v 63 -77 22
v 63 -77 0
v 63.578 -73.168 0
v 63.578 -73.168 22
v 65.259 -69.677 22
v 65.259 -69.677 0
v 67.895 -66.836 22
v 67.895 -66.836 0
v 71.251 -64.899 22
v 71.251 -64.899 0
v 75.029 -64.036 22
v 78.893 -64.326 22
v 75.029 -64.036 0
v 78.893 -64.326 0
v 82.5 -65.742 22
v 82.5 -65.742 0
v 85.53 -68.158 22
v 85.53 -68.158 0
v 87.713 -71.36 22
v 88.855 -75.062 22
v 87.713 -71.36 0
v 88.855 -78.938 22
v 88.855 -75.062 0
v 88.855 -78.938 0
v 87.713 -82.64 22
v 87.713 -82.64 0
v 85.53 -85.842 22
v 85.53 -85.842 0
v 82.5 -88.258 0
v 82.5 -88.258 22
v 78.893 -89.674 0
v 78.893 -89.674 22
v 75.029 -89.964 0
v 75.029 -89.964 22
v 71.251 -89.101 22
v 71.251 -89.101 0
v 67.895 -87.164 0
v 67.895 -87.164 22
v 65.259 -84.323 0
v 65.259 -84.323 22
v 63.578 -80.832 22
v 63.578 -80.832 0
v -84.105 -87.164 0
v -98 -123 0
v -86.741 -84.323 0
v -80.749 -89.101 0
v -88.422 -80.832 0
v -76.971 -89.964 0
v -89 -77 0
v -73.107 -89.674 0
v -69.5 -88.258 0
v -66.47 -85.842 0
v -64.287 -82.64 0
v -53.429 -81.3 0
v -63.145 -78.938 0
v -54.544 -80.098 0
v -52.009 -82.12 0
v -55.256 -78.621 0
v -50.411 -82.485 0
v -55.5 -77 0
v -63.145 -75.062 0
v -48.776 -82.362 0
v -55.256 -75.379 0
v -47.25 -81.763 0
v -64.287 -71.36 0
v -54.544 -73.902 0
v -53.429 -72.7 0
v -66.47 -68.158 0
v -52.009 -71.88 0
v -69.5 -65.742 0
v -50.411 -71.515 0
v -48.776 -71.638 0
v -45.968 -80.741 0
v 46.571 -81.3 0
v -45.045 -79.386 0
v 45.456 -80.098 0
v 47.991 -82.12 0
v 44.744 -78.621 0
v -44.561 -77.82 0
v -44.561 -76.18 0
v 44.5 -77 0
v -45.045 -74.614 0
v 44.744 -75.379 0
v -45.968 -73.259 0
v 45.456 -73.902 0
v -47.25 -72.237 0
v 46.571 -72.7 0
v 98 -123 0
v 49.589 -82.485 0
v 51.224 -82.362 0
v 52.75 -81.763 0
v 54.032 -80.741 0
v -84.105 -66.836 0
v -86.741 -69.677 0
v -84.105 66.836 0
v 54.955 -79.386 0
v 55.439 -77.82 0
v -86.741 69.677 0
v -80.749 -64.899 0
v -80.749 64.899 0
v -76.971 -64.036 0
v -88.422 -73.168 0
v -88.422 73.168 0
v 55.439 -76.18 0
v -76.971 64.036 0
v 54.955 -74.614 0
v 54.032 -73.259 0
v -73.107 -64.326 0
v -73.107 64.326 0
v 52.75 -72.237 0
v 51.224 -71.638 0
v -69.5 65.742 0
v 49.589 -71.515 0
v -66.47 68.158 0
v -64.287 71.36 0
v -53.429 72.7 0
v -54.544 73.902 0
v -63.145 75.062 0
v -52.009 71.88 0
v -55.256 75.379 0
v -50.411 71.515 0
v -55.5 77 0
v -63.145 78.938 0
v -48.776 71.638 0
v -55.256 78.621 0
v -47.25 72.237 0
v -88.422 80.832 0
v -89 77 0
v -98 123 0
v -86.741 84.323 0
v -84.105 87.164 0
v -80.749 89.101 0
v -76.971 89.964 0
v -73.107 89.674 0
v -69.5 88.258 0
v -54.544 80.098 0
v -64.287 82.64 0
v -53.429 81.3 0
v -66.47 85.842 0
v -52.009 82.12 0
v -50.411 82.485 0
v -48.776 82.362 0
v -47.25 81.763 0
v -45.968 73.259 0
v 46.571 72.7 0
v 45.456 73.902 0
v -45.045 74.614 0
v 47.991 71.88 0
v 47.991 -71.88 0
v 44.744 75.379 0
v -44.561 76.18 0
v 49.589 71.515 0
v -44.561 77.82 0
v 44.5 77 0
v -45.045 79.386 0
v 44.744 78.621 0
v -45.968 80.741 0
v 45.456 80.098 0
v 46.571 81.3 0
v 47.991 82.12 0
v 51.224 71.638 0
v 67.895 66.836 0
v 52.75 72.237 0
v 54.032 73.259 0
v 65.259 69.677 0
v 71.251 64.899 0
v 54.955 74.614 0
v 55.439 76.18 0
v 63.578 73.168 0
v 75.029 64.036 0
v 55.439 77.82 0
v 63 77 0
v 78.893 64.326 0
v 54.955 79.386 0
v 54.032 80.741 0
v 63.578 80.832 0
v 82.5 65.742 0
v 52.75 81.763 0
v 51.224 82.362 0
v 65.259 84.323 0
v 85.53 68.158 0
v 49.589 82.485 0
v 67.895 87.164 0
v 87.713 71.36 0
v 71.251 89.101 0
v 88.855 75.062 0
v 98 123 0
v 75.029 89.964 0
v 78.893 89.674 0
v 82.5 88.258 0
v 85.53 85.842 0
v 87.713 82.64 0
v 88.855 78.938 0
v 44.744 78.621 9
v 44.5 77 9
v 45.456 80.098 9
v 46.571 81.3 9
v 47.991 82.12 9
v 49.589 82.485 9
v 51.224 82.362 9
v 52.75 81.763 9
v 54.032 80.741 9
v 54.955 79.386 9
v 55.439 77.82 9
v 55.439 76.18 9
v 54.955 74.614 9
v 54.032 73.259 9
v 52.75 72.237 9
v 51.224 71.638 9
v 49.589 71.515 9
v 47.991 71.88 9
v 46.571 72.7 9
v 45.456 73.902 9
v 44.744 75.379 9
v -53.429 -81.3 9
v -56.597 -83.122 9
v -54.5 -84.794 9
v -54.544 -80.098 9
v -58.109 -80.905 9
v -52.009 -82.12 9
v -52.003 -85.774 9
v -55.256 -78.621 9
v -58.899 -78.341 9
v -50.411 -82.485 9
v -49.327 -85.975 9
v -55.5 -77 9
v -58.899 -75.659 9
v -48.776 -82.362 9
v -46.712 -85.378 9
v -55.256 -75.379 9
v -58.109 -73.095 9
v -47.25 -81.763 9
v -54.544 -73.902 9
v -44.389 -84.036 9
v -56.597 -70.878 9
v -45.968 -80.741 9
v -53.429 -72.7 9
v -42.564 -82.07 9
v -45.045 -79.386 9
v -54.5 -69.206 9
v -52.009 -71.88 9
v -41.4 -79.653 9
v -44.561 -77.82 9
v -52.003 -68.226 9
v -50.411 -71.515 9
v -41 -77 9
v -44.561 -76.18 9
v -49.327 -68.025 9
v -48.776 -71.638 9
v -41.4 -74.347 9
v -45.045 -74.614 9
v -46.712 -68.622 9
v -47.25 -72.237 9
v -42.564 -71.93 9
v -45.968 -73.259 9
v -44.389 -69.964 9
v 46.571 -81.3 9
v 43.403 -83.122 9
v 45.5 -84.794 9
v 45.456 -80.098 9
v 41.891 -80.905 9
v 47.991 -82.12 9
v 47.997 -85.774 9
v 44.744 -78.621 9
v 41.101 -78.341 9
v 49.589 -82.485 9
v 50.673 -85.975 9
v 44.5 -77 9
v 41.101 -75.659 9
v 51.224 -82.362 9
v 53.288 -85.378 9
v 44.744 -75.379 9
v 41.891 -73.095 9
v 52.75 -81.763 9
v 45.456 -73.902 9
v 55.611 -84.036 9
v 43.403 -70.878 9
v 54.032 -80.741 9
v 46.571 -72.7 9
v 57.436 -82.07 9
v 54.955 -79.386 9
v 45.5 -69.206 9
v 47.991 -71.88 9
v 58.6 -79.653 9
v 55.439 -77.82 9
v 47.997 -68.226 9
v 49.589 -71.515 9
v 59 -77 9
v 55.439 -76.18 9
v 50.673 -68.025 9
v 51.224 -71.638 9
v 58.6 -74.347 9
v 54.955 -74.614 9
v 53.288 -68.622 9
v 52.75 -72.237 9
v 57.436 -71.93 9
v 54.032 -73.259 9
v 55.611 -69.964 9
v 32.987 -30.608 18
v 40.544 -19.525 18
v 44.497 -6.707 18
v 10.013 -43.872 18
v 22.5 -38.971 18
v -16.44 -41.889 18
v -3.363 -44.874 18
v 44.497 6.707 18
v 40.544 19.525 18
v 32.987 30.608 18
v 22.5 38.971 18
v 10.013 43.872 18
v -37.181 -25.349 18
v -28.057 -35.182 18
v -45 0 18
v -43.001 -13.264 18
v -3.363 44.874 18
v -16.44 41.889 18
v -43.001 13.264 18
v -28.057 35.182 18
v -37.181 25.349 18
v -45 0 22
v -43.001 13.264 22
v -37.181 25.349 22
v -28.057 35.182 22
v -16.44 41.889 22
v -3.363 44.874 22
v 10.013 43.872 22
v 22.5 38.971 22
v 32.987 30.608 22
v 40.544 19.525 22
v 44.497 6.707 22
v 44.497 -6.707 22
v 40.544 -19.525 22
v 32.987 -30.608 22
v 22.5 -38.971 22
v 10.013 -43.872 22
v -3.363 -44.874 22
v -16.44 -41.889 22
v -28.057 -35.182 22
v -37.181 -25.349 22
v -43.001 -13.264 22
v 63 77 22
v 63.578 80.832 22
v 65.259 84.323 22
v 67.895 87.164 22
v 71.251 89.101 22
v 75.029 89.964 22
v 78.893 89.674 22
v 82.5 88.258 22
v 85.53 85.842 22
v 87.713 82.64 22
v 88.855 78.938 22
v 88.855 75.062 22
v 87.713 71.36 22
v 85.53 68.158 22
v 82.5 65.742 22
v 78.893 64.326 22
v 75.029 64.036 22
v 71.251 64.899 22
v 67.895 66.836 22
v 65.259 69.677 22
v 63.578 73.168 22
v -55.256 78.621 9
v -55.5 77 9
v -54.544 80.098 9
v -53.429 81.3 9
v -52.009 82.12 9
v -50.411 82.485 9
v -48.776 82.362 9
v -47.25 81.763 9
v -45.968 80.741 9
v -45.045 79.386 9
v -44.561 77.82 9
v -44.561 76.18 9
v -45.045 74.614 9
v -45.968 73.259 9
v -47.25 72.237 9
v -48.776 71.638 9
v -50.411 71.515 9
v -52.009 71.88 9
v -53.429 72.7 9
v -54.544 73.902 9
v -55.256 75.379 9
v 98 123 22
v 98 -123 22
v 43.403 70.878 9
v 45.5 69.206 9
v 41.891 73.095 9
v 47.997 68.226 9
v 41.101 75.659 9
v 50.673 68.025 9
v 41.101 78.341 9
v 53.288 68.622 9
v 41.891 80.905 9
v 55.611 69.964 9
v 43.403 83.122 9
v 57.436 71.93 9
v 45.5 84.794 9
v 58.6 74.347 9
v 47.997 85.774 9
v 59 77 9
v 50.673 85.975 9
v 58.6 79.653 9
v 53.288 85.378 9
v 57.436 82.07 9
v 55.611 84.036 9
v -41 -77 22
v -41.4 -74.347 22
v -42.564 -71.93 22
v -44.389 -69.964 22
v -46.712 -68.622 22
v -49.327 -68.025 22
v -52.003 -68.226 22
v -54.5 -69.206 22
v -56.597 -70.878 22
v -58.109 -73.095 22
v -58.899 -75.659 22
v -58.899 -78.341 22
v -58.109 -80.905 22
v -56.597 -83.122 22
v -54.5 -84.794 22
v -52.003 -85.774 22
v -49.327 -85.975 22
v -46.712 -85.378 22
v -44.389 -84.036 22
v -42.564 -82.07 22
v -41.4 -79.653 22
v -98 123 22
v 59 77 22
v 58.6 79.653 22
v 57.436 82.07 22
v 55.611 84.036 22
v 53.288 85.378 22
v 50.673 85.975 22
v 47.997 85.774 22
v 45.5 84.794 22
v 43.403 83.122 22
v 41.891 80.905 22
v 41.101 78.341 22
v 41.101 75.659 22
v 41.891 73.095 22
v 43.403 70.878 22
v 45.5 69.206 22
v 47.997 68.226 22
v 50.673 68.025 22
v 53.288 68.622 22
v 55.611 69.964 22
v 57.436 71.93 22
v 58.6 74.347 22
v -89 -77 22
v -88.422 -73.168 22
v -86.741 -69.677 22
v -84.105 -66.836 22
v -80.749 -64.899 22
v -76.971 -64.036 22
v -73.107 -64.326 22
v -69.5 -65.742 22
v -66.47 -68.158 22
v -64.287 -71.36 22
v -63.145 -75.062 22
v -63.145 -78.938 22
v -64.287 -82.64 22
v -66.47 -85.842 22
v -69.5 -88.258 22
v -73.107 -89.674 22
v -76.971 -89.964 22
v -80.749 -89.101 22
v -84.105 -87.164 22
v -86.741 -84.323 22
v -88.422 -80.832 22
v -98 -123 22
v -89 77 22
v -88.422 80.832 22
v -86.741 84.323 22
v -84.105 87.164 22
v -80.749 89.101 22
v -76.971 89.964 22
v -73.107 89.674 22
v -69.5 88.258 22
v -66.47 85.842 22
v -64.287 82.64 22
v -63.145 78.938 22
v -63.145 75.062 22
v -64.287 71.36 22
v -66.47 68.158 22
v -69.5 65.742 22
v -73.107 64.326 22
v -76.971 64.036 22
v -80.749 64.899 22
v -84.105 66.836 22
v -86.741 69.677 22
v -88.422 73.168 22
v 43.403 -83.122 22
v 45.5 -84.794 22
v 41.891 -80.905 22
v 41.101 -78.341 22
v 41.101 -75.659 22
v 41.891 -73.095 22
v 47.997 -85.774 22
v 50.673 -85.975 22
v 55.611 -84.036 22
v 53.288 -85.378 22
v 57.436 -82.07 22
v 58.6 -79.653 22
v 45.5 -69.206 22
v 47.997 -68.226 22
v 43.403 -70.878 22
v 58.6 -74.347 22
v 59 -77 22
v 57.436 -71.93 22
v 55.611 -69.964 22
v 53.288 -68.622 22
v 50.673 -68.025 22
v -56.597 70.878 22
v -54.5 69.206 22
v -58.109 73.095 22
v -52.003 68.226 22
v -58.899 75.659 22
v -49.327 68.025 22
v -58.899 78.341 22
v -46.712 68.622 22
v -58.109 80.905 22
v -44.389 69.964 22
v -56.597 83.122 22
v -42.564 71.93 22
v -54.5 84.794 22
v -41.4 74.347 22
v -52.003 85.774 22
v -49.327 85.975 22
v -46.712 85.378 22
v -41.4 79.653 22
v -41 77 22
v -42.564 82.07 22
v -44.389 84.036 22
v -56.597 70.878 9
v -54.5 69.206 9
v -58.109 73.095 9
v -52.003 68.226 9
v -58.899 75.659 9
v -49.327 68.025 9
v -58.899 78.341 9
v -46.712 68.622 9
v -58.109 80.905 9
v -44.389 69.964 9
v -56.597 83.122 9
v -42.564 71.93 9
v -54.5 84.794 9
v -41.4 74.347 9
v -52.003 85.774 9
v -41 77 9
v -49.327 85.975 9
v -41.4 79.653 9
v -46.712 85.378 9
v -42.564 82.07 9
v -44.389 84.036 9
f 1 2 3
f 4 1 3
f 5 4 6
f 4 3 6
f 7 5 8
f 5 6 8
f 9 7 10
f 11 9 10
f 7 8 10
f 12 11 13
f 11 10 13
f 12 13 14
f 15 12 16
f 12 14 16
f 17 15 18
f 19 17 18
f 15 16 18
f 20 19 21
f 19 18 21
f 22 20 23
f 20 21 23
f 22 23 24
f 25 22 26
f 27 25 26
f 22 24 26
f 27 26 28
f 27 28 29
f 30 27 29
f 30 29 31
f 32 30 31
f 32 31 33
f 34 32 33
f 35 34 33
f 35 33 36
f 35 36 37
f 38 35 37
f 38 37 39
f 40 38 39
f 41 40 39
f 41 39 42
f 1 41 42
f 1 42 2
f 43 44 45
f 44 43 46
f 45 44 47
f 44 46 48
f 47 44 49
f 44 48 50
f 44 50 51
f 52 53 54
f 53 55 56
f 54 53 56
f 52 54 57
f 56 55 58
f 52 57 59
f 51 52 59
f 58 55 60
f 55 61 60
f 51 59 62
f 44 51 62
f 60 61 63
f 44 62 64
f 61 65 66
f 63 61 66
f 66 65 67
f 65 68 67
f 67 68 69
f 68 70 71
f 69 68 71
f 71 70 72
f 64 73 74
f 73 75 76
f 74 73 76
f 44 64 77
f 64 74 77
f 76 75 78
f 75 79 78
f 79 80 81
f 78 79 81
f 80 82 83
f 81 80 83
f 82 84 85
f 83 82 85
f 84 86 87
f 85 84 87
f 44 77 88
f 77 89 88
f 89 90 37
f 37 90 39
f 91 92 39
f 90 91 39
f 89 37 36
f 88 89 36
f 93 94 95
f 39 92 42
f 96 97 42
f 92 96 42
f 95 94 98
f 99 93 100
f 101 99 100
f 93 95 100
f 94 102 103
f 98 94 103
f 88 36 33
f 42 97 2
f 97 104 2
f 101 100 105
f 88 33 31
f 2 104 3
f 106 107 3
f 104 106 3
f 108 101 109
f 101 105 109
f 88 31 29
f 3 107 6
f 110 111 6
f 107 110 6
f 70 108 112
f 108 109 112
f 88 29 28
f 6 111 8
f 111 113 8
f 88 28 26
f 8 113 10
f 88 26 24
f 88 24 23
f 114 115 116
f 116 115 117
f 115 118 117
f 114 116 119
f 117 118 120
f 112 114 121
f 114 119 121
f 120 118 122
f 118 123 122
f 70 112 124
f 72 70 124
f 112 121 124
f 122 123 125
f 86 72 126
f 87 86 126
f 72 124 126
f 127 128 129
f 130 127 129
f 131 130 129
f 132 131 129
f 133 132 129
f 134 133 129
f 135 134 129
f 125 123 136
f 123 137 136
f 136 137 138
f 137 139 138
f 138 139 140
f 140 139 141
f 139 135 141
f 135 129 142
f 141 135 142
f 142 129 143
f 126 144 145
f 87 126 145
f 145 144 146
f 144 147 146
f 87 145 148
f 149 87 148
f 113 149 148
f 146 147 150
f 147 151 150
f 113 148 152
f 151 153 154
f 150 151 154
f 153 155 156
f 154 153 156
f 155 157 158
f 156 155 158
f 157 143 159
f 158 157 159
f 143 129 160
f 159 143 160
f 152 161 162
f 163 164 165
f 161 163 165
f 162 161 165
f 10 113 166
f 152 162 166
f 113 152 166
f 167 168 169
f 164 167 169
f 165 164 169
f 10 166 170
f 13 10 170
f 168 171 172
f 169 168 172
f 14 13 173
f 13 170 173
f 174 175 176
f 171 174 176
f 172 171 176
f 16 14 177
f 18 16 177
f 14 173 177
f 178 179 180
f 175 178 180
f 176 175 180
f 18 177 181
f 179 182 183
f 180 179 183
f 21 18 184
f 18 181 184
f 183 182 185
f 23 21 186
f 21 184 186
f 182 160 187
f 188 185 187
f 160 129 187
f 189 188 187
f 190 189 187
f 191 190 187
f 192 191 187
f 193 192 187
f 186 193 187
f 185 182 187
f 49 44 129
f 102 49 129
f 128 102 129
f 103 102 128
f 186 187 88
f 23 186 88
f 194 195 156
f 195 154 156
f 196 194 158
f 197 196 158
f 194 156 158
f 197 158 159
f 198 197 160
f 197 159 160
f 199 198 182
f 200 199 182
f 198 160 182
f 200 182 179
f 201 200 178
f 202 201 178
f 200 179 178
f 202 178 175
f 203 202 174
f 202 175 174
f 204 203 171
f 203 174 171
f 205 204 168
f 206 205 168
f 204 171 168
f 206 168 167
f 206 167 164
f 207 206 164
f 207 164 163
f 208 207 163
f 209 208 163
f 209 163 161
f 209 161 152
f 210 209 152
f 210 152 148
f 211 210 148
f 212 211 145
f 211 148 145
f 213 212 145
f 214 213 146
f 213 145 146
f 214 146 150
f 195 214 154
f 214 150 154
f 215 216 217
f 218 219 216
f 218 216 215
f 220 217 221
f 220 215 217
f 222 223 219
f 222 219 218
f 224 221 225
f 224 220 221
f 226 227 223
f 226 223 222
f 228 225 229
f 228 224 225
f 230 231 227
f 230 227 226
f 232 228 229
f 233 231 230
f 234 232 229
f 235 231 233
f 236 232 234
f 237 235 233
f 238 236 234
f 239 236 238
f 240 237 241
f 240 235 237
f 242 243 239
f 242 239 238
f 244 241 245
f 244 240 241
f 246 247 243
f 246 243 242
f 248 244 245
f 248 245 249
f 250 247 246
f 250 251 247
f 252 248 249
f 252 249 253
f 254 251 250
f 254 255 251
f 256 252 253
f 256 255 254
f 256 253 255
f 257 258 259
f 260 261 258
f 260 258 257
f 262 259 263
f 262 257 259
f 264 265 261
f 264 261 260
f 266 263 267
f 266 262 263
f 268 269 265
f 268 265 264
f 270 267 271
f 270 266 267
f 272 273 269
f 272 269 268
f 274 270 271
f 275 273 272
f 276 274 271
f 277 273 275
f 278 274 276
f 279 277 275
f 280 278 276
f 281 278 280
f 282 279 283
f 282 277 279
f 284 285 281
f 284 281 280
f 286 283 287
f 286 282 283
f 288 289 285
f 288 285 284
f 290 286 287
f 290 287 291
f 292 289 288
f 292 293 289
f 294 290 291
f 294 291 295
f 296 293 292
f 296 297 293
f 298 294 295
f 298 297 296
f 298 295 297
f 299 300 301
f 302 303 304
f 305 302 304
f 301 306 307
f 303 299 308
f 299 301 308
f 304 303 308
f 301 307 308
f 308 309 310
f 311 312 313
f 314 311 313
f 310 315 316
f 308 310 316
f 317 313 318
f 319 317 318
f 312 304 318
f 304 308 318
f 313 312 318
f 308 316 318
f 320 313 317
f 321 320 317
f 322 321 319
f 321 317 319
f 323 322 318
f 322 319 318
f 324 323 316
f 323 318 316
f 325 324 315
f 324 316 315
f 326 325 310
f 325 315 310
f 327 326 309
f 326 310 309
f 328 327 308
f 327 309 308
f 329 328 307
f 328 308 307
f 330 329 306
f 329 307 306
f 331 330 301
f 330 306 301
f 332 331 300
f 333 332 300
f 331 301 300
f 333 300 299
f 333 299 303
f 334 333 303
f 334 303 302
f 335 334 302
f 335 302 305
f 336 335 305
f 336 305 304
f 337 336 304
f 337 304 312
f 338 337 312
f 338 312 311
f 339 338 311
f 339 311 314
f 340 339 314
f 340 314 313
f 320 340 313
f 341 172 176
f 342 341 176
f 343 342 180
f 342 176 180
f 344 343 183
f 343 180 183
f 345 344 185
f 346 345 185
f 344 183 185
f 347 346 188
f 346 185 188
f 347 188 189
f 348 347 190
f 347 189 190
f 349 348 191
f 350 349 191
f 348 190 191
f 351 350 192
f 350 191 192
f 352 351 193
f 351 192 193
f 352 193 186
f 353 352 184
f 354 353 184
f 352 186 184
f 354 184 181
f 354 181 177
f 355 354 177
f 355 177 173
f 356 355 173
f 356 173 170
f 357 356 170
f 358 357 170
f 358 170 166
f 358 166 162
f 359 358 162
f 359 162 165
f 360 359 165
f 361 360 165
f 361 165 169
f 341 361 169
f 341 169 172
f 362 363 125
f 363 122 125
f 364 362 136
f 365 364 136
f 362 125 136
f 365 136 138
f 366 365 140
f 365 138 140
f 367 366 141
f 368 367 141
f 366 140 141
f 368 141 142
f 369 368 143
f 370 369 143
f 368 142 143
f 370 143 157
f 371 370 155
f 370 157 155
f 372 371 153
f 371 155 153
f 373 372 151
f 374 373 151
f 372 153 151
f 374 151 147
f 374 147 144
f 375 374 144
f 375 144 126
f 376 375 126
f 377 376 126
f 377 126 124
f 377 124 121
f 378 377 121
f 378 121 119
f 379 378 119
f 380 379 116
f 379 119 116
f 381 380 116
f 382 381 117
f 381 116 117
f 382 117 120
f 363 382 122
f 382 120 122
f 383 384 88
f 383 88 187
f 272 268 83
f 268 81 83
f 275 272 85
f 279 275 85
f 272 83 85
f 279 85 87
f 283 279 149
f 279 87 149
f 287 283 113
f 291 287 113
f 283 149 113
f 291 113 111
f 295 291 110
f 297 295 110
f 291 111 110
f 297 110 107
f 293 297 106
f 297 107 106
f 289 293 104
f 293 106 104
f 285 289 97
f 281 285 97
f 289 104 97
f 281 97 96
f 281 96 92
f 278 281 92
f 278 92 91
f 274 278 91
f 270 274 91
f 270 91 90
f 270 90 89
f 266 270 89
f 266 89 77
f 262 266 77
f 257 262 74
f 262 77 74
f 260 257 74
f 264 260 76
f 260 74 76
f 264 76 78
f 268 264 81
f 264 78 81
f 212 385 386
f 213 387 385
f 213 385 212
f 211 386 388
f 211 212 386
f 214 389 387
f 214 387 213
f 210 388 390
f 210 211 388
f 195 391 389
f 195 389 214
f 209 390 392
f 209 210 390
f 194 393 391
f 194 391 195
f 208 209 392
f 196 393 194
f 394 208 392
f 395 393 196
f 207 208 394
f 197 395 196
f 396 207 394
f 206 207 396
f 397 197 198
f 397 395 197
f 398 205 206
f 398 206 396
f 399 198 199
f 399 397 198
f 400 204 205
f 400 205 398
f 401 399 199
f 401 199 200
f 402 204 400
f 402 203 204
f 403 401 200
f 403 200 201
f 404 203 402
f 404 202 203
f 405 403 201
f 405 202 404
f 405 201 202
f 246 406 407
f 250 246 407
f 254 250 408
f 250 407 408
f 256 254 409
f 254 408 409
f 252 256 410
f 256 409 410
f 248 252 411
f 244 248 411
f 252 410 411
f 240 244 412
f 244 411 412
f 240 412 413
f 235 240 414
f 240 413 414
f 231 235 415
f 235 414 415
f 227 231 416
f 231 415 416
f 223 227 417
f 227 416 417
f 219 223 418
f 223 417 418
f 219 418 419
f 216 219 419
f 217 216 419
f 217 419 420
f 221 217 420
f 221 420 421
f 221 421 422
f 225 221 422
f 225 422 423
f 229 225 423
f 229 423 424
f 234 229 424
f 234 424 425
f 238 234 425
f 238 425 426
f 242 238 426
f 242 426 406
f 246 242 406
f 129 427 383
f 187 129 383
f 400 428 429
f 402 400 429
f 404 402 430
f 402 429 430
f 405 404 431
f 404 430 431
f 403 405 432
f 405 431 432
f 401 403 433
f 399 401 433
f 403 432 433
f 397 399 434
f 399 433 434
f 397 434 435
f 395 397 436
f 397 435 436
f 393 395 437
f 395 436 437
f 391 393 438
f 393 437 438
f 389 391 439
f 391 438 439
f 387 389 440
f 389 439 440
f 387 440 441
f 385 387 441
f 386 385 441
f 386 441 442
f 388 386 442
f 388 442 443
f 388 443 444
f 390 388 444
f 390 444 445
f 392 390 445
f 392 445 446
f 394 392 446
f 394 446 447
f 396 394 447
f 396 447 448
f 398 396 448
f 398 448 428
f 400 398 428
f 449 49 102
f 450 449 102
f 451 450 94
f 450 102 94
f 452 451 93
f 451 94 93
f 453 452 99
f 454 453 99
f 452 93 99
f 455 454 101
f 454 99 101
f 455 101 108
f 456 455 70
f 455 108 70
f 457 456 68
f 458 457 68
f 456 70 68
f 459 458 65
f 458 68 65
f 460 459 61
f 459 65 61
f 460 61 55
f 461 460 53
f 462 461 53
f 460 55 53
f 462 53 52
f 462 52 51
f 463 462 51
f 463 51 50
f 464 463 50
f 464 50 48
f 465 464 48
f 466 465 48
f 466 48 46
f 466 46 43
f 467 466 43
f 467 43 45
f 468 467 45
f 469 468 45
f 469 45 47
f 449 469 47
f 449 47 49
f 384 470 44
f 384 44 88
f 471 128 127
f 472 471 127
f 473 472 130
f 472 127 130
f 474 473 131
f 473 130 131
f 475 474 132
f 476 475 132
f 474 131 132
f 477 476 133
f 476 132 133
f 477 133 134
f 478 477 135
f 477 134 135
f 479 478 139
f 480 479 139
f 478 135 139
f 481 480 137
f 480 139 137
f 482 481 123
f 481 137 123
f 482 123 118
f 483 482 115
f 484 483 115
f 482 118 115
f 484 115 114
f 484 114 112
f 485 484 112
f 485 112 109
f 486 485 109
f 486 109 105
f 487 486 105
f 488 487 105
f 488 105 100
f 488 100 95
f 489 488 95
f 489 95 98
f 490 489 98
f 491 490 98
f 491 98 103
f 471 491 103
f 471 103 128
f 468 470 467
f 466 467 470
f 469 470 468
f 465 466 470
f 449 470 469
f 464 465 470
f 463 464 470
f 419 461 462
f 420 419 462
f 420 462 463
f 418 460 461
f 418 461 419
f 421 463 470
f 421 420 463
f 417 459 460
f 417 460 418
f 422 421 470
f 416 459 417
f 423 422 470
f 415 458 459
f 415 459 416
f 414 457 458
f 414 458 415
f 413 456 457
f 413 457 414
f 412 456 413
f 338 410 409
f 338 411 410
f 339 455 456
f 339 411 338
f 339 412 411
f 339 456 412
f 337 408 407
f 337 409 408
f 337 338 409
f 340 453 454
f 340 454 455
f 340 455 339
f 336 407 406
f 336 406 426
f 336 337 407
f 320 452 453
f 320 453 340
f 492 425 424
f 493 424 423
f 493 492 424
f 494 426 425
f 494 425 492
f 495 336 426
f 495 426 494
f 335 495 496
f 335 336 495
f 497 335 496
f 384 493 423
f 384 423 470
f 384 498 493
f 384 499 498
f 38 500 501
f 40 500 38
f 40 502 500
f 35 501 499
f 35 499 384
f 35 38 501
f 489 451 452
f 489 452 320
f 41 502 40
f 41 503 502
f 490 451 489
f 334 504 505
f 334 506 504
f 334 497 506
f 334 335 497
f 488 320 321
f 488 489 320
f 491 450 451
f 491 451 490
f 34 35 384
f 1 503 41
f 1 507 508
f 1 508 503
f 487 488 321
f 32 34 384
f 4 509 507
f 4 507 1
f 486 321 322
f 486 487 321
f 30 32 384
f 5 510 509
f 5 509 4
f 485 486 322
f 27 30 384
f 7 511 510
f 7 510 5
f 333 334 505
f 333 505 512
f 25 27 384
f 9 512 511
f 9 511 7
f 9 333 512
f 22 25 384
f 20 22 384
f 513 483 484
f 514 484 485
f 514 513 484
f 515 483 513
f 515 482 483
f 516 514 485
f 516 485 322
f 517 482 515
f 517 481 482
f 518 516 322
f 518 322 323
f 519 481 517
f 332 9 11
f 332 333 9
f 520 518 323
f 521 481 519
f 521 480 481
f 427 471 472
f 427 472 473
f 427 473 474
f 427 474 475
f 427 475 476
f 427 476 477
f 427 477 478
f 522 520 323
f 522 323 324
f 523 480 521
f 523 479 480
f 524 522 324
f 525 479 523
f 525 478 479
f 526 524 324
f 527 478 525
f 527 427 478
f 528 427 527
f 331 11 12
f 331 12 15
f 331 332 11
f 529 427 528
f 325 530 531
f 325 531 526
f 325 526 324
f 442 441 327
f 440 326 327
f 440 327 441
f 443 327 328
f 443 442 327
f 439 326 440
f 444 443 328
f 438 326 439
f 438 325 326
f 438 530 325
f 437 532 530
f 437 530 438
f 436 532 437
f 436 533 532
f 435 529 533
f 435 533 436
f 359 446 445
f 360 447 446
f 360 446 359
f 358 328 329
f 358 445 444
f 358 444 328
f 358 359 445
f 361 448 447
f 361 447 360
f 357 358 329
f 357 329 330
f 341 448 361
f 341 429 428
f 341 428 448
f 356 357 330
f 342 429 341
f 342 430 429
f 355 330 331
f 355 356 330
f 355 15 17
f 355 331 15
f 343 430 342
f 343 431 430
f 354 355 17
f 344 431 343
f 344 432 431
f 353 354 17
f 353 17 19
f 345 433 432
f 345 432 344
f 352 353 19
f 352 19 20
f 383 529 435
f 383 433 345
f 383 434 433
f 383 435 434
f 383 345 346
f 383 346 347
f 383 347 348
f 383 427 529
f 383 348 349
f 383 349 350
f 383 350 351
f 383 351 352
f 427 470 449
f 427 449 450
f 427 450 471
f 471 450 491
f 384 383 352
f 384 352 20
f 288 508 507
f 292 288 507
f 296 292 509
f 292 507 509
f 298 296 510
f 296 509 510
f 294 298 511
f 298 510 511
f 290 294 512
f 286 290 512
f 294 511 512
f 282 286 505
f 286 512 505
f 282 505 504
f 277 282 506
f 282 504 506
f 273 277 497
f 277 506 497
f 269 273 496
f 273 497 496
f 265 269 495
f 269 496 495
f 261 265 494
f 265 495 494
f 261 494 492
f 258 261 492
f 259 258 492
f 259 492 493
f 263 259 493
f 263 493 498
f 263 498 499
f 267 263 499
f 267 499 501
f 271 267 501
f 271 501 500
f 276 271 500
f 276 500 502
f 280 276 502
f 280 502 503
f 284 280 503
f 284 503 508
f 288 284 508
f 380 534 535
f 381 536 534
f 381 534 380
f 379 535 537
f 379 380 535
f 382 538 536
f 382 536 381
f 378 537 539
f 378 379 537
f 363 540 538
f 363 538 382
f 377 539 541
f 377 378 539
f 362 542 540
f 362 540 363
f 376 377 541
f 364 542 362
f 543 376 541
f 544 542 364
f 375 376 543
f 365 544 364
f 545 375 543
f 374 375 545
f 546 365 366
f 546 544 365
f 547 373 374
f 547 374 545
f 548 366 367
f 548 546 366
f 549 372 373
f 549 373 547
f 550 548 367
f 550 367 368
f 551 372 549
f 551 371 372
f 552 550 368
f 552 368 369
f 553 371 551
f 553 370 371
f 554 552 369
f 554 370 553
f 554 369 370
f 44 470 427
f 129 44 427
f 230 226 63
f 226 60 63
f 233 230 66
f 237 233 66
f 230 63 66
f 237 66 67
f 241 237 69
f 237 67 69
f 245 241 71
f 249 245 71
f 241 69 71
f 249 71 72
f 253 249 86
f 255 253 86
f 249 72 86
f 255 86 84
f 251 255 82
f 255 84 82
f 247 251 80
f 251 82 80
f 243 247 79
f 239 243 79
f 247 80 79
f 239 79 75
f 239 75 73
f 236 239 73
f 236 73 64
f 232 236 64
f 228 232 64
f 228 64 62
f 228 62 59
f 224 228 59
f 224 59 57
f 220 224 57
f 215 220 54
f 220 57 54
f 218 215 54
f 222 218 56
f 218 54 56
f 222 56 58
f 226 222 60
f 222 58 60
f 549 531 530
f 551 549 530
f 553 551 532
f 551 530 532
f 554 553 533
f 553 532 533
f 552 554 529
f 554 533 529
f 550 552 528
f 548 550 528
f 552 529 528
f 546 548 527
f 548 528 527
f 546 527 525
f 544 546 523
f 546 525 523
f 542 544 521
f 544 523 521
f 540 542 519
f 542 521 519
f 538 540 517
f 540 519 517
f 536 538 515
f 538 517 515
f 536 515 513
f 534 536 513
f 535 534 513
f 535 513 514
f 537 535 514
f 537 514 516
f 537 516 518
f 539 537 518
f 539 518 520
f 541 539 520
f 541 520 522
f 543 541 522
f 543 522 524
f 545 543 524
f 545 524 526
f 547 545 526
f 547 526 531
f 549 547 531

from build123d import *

# Parameters (mm, degrees)
SKETCH_1_W                   = 196
SKETCH_1_H                   = 246
EXTRUDE_1_DEPTH              = 22
HOLE_WIZARD_M101_D           = 11
HOLE_WIZARD_M101_CBORE_D     = 18
HOLE_WIZARD_M101_CBORE_DEPTH = 13
HOLE_WIZARD_M221_D           = 26
HOLE_WIZARD_M801_D           = 90
HOLE_WIZARD_M801_DEPTH       = 4


with BuildPart() as part:
    # Эскиз1 → Бобышка-Вытянуть1 (new body)
    with BuildSketch(Plane.XY.offset(22)):
        Rectangle(SKETCH_1_W, SKETCH_1_H)
    extrude(amount=-EXTRUDE_1_DEPTH)

    # Цековка для  болта с шестигранной головкой M101 (through all)
    with Locations(Plane.XY.offset(22)):
        with Locations((50, 77), (50, -77), (-50, 77), (-50, -77)):
            CounterBoreHole(HOLE_WIZARD_M101_D / 2, HOLE_WIZARD_M101_CBORE_D / 2, HOLE_WIZARD_M101_CBORE_DEPTH)

    # Отверстие с зазором M221 (through all)
    with Locations(Plane.XY.offset(22)):
        with Locations((76, 77), (76, -77), (-76, -77), (-76, 77)):
            Hole(HOLE_WIZARD_M221_D / 2)

    # Отверстие с зазором M801
    with Locations(Plane.XY.offset(22)):
        with Locations((0, 0)):
            Hole(HOLE_WIZARD_M801_D / 2, depth=HOLE_WIZARD_M801_DEPTH)


solid = part.part
